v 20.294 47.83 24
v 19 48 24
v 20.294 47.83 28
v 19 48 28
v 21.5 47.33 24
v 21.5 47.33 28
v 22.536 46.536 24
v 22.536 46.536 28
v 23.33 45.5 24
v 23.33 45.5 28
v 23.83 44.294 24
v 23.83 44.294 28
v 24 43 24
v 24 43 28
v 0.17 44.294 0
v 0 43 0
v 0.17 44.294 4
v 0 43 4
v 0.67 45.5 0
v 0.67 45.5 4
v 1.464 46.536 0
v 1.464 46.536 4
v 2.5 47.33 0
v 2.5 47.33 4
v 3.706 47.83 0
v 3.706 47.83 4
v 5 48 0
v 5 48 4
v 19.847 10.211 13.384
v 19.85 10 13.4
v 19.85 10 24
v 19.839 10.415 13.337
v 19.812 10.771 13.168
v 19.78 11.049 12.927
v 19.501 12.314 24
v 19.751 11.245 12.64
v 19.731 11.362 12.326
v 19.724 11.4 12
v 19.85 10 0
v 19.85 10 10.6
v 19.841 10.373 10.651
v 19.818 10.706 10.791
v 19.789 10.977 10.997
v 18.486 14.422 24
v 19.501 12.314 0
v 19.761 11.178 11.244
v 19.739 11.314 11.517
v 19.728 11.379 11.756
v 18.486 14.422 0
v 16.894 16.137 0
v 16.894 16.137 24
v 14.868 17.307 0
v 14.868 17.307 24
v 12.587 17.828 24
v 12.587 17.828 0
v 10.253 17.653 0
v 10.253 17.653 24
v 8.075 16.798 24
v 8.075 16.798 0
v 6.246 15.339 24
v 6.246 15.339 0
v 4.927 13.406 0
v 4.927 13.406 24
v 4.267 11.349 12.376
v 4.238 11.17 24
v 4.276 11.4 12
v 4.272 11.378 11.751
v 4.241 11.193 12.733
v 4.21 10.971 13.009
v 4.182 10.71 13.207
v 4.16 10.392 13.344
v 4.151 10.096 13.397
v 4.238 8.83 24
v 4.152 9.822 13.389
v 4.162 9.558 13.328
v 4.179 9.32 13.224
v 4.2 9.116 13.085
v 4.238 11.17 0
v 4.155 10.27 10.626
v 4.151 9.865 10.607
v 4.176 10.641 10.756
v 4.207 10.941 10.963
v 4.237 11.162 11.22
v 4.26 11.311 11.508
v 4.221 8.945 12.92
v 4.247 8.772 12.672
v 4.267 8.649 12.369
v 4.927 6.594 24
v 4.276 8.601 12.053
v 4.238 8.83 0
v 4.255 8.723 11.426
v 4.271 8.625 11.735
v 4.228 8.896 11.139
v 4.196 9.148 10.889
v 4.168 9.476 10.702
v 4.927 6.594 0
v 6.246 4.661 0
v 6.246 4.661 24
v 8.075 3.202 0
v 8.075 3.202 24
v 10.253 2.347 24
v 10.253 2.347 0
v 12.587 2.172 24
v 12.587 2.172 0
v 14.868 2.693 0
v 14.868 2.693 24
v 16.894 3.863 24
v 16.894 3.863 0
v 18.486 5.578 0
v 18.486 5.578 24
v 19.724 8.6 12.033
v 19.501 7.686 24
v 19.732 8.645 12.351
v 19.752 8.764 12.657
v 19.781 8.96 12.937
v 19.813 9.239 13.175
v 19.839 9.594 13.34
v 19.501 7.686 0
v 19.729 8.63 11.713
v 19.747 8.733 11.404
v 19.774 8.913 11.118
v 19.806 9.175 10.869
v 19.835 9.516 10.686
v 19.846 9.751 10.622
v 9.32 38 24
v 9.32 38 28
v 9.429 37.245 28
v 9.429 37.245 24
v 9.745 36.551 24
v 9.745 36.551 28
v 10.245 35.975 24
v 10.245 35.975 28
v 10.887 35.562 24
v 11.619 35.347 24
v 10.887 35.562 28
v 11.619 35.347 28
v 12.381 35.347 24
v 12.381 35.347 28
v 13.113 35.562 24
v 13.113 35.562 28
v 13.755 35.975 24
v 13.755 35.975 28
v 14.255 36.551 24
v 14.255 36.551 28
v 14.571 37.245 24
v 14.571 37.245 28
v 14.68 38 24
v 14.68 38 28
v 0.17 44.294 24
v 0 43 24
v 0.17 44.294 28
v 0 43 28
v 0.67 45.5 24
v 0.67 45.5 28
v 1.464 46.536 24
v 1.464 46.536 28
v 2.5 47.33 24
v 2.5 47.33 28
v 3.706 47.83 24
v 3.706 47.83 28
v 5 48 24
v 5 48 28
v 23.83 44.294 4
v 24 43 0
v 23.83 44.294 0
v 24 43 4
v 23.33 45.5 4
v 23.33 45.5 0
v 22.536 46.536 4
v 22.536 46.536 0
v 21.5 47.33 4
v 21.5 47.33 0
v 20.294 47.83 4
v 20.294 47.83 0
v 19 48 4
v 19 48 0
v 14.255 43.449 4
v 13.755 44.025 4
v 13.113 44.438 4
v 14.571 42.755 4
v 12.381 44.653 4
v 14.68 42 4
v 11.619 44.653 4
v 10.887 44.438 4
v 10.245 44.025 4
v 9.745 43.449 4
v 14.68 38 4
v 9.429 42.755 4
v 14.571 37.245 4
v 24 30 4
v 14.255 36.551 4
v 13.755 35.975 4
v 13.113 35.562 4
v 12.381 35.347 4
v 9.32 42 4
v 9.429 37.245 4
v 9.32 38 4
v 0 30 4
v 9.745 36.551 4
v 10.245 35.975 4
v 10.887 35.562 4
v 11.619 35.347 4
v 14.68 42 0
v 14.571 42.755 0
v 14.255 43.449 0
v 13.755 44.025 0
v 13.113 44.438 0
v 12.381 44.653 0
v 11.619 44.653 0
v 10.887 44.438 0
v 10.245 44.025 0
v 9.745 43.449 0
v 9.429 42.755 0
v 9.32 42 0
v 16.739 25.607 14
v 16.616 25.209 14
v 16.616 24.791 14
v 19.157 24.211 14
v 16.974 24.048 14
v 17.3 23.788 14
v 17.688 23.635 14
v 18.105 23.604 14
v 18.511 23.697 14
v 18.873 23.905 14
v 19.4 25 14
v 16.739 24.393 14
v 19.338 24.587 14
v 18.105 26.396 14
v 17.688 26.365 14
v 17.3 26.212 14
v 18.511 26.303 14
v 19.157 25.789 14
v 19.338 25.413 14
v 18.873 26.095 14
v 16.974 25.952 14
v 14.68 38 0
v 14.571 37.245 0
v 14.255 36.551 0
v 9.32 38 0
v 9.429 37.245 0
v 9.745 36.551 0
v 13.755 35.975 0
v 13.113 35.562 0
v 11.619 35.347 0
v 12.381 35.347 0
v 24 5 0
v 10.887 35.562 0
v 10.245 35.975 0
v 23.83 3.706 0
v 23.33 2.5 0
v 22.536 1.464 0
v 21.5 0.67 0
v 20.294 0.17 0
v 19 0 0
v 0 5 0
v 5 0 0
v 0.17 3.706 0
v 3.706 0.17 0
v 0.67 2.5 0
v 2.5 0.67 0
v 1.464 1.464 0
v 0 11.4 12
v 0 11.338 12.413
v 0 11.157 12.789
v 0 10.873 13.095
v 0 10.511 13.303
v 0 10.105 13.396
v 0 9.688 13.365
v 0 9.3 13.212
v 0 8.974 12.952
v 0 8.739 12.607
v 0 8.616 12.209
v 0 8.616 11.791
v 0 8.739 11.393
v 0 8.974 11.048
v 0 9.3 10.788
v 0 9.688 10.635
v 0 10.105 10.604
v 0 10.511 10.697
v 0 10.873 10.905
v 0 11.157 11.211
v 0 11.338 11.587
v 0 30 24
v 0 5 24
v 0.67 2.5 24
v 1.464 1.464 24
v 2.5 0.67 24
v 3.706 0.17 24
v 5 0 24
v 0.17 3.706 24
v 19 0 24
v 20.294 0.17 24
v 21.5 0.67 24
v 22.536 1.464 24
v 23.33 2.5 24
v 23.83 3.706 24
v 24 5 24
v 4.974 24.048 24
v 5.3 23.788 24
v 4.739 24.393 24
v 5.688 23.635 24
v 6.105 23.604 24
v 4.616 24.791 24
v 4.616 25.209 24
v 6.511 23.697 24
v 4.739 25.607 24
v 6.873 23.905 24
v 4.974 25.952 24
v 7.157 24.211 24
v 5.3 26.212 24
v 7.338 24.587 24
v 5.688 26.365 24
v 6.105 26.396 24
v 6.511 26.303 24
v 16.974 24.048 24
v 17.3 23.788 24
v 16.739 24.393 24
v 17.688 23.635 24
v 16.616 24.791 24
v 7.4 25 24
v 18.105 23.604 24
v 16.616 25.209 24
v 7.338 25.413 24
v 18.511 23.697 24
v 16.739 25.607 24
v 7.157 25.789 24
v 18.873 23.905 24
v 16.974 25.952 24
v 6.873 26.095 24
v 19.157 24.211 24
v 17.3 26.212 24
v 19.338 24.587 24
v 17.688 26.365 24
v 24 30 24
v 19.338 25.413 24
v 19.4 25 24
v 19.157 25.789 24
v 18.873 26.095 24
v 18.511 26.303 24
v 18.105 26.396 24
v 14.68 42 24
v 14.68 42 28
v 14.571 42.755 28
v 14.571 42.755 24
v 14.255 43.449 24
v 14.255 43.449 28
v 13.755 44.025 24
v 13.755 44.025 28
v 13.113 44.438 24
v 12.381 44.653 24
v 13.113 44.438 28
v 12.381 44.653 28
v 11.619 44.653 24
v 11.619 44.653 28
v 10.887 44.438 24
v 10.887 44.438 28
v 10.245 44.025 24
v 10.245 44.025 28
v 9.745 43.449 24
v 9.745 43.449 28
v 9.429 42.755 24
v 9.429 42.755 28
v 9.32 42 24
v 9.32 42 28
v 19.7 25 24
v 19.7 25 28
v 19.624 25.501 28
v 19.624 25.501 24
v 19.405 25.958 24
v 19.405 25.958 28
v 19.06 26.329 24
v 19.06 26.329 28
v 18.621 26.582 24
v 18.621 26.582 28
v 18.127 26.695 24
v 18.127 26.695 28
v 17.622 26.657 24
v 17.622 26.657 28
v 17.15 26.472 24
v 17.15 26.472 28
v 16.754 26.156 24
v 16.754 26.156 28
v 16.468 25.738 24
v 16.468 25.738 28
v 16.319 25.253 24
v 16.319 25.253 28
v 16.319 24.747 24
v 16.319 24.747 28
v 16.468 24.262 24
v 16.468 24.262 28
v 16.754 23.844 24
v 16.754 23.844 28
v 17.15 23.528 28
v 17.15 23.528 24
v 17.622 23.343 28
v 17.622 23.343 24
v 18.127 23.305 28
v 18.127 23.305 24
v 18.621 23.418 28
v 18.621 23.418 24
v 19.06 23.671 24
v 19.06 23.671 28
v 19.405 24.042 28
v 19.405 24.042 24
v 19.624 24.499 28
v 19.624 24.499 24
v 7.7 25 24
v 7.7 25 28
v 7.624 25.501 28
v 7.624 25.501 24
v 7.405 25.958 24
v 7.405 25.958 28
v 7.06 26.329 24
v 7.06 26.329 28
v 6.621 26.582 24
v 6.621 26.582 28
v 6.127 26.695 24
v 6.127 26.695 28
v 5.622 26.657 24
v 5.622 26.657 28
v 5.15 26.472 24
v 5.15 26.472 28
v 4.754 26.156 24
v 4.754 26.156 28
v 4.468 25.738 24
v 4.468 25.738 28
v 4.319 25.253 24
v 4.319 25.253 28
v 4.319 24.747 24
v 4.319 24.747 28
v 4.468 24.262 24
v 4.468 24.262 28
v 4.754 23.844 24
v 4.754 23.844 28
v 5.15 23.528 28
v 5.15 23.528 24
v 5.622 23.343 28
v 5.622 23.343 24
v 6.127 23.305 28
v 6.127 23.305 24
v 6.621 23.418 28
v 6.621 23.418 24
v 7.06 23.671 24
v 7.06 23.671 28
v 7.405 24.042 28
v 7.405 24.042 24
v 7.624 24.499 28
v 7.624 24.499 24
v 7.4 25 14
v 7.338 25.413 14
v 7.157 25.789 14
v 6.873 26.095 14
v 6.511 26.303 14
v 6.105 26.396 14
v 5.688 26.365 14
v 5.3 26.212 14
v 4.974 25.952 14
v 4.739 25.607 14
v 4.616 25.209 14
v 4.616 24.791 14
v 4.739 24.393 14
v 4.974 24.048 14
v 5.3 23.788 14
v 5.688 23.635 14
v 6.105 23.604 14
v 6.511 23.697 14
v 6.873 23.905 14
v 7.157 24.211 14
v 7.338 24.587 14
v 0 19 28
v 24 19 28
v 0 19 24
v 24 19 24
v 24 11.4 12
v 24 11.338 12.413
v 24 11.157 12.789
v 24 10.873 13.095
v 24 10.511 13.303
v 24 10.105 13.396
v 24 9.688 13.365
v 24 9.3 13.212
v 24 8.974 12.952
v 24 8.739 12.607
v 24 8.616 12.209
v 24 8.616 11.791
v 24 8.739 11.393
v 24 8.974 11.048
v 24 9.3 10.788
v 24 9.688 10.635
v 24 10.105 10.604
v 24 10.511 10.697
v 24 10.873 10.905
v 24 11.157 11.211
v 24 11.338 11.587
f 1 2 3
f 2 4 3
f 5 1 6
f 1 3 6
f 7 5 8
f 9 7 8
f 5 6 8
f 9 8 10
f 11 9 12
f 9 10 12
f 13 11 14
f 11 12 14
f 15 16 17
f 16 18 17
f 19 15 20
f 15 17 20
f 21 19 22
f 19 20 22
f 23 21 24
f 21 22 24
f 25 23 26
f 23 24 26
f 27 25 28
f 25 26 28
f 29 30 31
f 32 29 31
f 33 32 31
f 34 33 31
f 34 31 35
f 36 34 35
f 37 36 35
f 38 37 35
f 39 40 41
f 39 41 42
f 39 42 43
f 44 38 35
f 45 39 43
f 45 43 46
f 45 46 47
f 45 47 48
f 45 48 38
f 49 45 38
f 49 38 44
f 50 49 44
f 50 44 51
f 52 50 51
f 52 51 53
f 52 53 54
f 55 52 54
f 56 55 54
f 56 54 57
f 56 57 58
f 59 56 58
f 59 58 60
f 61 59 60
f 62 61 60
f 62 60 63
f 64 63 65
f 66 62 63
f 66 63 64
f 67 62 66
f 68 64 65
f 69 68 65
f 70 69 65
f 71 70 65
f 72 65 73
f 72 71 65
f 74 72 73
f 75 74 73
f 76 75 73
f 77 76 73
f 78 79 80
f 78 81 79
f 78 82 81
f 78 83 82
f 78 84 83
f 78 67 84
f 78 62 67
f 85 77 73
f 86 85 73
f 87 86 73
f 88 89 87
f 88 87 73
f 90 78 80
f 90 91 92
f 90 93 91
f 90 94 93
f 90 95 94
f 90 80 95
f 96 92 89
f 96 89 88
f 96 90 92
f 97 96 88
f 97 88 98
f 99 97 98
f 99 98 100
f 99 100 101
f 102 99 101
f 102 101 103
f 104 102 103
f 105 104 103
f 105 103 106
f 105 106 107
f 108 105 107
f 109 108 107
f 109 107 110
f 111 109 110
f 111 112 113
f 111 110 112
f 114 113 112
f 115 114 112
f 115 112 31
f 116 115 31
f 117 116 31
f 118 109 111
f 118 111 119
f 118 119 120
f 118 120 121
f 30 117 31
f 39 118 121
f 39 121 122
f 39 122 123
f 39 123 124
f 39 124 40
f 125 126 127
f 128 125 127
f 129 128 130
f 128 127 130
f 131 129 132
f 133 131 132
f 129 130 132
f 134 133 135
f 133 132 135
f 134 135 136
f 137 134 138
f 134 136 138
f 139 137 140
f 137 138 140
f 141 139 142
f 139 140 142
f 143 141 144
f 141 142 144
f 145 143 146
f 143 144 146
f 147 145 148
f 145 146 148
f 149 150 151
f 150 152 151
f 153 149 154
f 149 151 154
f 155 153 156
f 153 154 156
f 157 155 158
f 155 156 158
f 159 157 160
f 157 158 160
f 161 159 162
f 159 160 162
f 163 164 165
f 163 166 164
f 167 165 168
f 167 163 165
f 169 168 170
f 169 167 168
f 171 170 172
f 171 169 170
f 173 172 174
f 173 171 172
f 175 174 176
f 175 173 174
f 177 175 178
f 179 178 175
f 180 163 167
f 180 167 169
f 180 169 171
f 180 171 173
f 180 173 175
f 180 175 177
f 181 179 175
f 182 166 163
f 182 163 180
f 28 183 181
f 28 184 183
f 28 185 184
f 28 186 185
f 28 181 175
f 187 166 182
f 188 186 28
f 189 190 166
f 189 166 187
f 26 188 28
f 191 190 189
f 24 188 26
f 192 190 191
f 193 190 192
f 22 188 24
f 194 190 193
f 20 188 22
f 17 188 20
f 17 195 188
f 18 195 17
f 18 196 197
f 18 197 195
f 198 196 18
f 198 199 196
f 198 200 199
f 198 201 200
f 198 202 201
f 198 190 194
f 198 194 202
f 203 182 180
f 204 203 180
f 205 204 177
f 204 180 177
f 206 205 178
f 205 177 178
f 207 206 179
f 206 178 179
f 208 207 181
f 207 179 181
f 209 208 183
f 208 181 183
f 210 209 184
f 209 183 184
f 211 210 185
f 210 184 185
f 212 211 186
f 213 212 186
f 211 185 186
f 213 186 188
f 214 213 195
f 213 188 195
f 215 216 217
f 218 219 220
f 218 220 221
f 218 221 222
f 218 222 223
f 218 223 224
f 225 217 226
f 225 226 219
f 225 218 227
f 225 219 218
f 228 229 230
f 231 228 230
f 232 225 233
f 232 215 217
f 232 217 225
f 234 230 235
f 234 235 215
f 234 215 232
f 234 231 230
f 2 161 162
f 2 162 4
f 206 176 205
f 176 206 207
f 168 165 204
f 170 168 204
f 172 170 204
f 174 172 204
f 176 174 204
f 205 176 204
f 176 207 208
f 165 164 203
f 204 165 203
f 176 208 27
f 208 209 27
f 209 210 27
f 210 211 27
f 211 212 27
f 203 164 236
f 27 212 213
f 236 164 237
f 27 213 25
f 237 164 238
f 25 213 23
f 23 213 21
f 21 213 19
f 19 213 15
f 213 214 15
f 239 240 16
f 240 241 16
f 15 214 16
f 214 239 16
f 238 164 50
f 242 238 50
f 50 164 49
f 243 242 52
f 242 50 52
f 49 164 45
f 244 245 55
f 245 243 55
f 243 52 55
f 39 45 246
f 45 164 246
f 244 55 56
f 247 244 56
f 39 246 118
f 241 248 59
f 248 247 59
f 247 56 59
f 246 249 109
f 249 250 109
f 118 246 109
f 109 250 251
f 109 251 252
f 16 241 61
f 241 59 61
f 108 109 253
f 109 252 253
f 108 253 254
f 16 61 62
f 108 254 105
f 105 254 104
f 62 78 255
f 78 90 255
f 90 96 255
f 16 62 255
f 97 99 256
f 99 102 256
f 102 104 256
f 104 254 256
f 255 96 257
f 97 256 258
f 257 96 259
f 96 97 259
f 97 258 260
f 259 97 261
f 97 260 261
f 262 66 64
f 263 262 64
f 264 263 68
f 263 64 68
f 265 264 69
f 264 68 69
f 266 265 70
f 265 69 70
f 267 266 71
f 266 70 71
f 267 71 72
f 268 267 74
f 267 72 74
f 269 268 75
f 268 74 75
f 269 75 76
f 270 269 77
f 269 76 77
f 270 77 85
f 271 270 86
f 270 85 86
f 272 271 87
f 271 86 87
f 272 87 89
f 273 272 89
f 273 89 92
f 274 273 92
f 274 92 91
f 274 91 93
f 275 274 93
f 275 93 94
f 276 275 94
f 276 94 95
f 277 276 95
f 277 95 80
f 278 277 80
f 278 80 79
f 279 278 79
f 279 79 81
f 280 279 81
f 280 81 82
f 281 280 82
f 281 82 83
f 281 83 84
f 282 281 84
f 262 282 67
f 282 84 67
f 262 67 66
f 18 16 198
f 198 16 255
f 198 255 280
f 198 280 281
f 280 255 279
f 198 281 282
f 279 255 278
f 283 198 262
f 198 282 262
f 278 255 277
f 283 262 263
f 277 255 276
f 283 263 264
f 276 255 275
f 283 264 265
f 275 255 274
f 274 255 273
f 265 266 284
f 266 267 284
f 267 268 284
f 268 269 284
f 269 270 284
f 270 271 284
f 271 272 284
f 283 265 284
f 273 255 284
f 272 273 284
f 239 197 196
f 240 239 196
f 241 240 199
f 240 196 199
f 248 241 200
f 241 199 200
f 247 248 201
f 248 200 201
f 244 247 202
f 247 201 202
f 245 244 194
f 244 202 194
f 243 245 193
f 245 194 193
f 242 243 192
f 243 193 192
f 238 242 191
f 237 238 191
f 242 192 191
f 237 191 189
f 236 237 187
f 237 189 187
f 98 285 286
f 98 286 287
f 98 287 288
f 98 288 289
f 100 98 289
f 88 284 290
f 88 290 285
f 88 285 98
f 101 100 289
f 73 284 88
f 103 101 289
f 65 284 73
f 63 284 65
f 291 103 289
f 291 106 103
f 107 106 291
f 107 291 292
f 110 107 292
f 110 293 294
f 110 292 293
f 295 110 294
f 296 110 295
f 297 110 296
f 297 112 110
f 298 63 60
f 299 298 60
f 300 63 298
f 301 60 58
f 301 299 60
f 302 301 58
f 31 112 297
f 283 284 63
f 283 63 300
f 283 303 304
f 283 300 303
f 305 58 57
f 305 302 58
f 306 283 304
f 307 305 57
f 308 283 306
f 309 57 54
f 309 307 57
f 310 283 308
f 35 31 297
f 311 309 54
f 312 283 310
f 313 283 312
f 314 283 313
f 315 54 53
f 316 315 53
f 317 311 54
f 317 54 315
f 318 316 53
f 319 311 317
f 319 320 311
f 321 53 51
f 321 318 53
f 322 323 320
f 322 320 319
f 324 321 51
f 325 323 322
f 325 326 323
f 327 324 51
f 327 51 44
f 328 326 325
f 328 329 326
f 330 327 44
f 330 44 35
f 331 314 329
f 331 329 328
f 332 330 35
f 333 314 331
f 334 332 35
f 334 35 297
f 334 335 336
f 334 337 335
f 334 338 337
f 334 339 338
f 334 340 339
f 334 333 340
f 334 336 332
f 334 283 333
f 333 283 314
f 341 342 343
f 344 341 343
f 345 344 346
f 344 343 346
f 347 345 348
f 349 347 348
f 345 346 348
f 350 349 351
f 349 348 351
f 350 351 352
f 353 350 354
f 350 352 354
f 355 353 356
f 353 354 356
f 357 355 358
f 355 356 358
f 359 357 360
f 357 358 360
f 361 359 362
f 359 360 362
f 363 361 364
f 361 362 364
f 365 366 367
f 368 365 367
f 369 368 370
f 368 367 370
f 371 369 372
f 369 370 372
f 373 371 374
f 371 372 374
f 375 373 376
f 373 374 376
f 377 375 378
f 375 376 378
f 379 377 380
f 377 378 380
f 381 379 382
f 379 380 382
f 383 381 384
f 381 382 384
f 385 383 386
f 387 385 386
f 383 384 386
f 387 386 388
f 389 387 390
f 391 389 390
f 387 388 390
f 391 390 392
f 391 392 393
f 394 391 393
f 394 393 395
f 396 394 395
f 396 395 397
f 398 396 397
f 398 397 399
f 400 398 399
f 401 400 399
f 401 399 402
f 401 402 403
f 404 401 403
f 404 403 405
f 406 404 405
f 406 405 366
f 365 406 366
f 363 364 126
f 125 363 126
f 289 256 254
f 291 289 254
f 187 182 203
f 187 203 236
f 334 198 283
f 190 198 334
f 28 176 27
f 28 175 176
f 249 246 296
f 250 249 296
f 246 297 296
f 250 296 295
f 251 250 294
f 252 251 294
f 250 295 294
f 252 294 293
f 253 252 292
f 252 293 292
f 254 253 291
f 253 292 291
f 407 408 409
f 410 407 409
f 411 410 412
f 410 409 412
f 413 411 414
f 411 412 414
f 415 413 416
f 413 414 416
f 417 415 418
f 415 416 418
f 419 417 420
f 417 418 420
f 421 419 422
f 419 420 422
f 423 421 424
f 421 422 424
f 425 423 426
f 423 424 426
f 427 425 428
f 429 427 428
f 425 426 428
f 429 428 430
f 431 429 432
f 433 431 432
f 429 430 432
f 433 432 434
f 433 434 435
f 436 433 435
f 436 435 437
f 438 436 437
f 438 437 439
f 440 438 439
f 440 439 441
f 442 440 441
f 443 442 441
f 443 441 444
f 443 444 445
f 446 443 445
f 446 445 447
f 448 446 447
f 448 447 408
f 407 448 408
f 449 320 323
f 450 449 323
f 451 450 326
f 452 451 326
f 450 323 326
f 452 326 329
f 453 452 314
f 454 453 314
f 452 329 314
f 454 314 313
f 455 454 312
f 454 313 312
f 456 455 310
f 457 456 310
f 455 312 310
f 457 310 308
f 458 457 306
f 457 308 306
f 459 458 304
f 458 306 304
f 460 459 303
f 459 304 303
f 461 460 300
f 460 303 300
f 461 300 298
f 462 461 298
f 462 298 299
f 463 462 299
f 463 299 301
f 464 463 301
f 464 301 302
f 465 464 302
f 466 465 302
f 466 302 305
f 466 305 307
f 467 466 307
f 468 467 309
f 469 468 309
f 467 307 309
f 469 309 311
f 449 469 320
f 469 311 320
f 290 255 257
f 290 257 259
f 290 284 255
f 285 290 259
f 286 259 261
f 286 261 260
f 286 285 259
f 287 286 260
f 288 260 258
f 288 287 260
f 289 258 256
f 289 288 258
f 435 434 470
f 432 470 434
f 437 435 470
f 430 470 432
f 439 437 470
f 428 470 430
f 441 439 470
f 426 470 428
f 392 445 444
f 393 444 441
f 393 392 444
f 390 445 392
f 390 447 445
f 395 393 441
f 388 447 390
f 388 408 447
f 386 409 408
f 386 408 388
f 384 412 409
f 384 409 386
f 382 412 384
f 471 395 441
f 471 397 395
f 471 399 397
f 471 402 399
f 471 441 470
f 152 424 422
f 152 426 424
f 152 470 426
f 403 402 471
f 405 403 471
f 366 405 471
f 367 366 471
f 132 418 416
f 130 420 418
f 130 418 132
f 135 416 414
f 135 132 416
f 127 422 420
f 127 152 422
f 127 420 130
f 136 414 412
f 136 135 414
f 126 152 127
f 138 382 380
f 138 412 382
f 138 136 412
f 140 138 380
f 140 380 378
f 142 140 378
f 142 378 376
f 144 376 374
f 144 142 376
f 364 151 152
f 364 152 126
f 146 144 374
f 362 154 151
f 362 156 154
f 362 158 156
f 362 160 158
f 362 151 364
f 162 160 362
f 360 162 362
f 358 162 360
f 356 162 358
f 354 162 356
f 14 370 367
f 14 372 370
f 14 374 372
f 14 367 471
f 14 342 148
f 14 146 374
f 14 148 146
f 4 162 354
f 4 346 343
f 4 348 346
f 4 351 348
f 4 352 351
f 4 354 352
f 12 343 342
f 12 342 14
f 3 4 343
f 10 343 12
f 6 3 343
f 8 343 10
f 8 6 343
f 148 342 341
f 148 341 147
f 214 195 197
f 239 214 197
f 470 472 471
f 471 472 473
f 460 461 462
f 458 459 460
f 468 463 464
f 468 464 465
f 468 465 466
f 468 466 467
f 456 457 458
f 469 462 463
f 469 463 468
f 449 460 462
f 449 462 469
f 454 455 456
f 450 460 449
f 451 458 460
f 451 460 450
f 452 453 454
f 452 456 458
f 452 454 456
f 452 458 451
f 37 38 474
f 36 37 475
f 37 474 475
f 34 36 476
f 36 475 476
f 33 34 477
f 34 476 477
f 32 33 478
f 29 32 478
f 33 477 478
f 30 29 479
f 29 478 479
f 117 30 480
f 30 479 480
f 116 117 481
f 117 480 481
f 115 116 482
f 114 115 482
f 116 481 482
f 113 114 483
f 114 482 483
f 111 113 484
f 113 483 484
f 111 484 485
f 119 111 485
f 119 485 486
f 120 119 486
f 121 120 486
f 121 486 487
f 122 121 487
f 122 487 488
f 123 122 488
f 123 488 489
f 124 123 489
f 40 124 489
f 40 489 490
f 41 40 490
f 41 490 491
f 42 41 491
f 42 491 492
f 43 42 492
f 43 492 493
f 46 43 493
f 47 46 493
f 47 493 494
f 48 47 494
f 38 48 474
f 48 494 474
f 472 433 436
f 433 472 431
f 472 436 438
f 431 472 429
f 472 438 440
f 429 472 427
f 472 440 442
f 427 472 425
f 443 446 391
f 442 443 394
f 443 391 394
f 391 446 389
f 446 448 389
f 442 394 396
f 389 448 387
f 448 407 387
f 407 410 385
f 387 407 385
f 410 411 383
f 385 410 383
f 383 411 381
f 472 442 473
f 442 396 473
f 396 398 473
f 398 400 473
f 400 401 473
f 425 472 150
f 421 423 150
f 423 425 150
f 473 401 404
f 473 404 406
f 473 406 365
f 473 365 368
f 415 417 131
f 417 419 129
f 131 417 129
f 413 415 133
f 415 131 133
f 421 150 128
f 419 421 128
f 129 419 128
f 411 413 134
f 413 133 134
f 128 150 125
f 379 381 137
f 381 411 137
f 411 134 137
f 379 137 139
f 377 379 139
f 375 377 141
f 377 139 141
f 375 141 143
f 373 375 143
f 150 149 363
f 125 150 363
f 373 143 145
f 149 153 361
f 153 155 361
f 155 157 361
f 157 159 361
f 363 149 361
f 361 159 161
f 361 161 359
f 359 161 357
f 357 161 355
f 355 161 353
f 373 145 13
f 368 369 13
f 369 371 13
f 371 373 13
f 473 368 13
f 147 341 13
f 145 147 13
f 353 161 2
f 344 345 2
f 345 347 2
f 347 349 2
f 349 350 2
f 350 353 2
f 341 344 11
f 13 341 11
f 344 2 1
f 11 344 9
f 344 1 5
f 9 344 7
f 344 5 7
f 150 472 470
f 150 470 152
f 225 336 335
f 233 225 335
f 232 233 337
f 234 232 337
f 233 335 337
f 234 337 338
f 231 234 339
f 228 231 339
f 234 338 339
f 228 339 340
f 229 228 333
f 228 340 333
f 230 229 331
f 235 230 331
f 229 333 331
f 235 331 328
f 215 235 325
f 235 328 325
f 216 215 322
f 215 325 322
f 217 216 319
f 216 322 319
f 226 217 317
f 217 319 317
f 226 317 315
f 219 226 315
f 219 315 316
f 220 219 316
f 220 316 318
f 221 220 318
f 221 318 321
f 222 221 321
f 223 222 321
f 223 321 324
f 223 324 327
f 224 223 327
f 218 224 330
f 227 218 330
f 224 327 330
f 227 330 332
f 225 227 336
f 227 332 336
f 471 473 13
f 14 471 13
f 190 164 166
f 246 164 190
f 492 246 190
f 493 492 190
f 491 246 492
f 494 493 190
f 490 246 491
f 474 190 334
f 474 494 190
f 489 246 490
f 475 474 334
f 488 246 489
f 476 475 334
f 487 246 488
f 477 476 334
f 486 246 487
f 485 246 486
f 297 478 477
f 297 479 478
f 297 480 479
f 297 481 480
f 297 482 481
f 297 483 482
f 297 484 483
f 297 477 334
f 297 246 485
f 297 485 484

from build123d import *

# Parameters (mm, degrees)
SKETCH_W        = 24
SKETCH_H        = 30
SKETCH_R        = 7.85
PAD_DEPTH       = 24
SKETCH001_W     = 24
SKETCH001_H     = 4
PAD001_DEPTH    = 18
FILLET_R        = 5
SKETCH002_R     = 1.4
POCKET_DEPTH    = 10
POCKET001_DEPTH = 5
SKETCH004_R     = 1.4
POCKET002_DEPTH = 24.001
BOX_W           = 24
BOX_H           = 29
BOX_DEPTH       = 4
POCKET003_DEPTH = 5
SKETCH006_R     = 1.7
POCKET004_DEPTH = 5
FILLET001_R     = 5


with BuildPart() as pocket002:
    # Sketch → Pad (new body)
    with BuildSketch(Plane.XY):
        with Locations((12, 15)):
            Rectangle(SKETCH_W, SKETCH_H)
        with Locations((12, 10)):
            Circle(SKETCH_R, mode=Mode.SUBTRACT)
    extrude(amount=PAD_DEPTH)

    # Sketch001 → Pad001 (new body)
    with BuildSketch(Plane(origin=(0, 30, 0), x_dir=(-1, 0, 0), z_dir=(0, 1, 0))):
        with Locations((-12, 2)):
            Rectangle(SKETCH001_W, SKETCH001_H)
    extrude(amount=PAD001_DEPTH)

    # Fillet
    fillet_edges = [pocket002.edges().sort_by_distance(p)[0] for p in [
        (24, 48, 2),
        (24, 0, 12),
        (0, 0, 12),
        (0, 48, 2),
    ]]
    fillet(fillet_edges, radius=FILLET_R)

    # Sketch002 → Pocket (cut)
    with BuildSketch(Plane.XY.offset(24)):
        with Locations((6, 25)):
            Circle(SKETCH002_R)
        with Locations((18, 25)):
            Circle(SKETCH002_R)
    extrude(amount=-POCKET_DEPTH, mode=Mode.SUBTRACT)

    # Sketch003 → Pocket001 (cut)
    with BuildSketch(Plane.XY.offset(4)):
        with BuildLine():
            ThreePointArc((14.68, 42), (12, 44.68), (9.32, 42))
            Line((9.32, 42), (9.32, 38))
            ThreePointArc((9.32, 38), (12, 35.32), (14.68, 38))
            Line((14.68, 42), (14.68, 38))
        make_face()
    extrude(amount=-POCKET001_DEPTH, mode=Mode.SUBTRACT)

    # Sketch004 → Pocket002 (cut, through all)
    with BuildSketch(Plane.YZ.offset(24)):
        with Locations((10, 12)):
            Circle(SKETCH004_R)
    extrude(amount=-POCKET002_DEPTH, mode=Mode.SUBTRACT)


with BuildPart() as fillet001:
    # Box → Box (new body)
    with BuildSketch(Plane(origin=(0, 19, 24), x_dir=(1, 0, 0), z_dir=(0, 0, 1))):
        with Locations((12, 14.5)):
            Rectangle(BOX_W, BOX_H)
    extrude(amount=BOX_DEPTH)

    # Sketch005 → Pocket003 (cut)
    with BuildSketch(Plane(origin=(0, 19, 28), x_dir=(1, 0, 0), z_dir=(0, 0, 1))):
        with BuildLine():
            ThreePointArc((14.68, 23), (12, 25.68), (9.32, 23))
            Line((9.32, 23), (9.32, 19))
            ThreePointArc((9.32, 19), (12, 16.32), (14.68, 19))
            Line((14.68, 23), (14.68, 19))
        make_face()
    extrude(amount=-POCKET003_DEPTH, mode=Mode.SUBTRACT)

    # Sketch006 → Pocket004 (cut)
    with BuildSketch(Plane(origin=(0, 19, 28), x_dir=(1, 0, 0), z_dir=(0, 0, 1))):
        with Locations((6, 6)):
            Circle(SKETCH006_R)
        with Locations((18, 6)):
            Circle(SKETCH006_R)
    extrude(amount=-POCKET004_DEPTH, mode=Mode.SUBTRACT)

    # Fillet001
    fillet001_edges = [fillet001.edges().sort_by_distance(p)[0] for p in [
        (24, 48, 26),
        (0, 48, 26),
    ]]
    fillet(fillet001_edges, radius=FILLET001_R)


solid = Compound([pocket002.part, fillet001.part])
